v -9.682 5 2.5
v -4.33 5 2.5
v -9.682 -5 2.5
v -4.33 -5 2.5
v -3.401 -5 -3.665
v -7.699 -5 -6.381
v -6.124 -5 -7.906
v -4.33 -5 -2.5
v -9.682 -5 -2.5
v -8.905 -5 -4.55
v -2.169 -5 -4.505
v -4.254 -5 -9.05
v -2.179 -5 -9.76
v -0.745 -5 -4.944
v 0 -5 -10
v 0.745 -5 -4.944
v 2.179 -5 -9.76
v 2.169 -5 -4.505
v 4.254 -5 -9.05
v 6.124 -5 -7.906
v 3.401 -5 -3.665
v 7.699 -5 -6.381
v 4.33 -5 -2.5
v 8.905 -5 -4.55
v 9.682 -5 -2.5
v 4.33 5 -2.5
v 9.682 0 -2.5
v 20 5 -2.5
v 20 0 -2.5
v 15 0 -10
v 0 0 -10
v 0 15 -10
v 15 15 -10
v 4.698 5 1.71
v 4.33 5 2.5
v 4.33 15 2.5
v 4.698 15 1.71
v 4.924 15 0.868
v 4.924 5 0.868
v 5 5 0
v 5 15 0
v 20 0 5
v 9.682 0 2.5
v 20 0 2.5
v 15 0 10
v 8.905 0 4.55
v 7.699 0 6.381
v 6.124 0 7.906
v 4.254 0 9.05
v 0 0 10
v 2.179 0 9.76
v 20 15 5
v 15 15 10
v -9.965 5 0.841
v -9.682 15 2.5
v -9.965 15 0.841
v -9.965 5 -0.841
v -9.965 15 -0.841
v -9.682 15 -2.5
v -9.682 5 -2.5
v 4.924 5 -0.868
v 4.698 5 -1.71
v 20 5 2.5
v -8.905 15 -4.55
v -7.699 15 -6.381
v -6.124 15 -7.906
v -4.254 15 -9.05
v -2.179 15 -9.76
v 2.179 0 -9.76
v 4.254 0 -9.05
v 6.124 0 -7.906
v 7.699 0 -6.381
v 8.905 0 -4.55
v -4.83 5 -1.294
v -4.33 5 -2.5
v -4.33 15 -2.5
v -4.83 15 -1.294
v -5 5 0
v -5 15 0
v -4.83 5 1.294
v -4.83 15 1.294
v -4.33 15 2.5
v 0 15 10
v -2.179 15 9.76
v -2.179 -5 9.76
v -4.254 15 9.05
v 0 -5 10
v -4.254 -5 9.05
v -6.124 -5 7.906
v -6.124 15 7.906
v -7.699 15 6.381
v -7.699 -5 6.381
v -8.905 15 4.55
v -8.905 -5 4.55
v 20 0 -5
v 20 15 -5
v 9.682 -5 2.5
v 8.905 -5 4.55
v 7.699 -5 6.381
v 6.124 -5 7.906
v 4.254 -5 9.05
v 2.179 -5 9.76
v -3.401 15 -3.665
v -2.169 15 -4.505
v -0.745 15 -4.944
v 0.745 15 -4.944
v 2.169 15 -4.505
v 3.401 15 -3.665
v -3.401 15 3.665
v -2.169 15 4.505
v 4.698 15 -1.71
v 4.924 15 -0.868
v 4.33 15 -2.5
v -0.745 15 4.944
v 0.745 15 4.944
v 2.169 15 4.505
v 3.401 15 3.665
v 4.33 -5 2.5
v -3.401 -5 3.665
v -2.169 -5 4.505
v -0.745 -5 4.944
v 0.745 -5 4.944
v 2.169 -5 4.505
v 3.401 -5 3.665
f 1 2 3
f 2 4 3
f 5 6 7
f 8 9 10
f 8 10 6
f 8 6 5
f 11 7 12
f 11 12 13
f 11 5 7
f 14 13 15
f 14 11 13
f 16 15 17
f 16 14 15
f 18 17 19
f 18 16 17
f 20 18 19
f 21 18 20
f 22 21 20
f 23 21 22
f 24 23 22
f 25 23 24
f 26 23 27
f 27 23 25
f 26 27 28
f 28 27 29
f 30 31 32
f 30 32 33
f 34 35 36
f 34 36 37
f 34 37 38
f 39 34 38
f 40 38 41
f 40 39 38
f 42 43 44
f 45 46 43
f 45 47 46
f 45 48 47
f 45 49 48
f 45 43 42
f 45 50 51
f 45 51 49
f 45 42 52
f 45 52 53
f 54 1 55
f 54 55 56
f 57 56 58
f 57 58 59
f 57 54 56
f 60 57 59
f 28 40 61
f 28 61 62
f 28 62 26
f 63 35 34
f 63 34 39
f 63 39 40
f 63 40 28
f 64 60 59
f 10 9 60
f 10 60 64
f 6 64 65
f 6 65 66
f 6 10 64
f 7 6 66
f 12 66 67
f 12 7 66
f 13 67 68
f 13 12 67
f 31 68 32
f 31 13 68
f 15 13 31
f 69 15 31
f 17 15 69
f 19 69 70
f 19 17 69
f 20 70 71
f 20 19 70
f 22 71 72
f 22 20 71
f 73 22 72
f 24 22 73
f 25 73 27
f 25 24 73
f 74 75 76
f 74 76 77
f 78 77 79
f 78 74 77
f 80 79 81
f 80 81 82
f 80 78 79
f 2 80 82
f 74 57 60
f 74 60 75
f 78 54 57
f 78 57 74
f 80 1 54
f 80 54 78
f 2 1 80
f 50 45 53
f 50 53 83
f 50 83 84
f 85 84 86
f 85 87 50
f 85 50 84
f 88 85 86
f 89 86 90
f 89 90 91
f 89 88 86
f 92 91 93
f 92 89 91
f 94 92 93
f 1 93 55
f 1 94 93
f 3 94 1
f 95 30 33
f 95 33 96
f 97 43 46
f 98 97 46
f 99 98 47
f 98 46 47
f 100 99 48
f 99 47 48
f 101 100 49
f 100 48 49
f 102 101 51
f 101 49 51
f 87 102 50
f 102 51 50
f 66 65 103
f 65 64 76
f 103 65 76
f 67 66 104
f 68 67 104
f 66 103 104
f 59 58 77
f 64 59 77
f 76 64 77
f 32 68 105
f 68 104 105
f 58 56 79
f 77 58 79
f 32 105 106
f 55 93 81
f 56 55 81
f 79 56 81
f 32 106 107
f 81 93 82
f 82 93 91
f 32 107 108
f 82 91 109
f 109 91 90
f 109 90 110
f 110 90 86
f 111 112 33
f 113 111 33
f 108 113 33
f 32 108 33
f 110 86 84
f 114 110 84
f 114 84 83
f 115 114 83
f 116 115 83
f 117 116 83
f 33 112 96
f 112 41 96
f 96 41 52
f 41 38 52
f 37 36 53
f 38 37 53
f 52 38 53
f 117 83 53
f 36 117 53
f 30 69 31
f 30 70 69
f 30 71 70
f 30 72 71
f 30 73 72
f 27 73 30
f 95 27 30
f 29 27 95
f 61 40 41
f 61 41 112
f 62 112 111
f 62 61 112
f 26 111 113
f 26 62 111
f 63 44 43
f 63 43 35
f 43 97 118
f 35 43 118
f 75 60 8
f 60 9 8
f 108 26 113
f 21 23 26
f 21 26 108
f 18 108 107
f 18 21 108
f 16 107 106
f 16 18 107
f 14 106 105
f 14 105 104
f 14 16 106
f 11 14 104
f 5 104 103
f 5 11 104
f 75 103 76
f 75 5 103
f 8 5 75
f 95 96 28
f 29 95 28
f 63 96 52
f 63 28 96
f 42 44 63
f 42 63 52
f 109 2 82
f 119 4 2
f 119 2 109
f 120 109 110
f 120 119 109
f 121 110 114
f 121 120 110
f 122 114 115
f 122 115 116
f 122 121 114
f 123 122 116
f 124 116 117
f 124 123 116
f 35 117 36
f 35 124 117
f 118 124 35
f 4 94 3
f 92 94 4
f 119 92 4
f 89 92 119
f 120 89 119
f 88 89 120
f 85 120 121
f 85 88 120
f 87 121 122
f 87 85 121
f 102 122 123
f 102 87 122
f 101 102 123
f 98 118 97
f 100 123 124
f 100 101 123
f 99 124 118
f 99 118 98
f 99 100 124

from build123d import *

# Parameters (mm, degrees)
F1_DEPTH = 5
F2_DEPTH = 15
F3_DEPTH = 5


with BuildPart() as f1:
    # F0 (on Front) → F1 (new body)
    with BuildSketch(Plane.XZ):
        with BuildLine():
            ThreePointArc((-4.3301270189, 2.5), (0, 5), (4.3301270189, 2.5))
            Line((4.3301270189, 2.5), (9.6824583655, 2.5))
            ThreePointArc((9.6824583655, 2.5), (6.123724357, 7.9056941504), (0, 10))
            ThreePointArc((0, 10), (-6.123724357, 7.9056941504), (-9.6824583655, 2.5))
            Line((-9.6824583655, 2.5), (-4.3301270189, 2.5))
        make_face()
    extrude(amount=F1_DEPTH)



with BuildPart() as f1b:
    # F0 (on Front) → F1, piece 2 (new body)
    with BuildSketch(Plane.XZ):
        with BuildLine():
            Line((9.6824583655, -2.5), (4.3301270189, -2.5))
            ThreePointArc((4.3301270189, -2.5), (0, -5), (-4.3301270189, -2.5))
            Line((-4.3301270189, -2.5), (-9.6824583655, -2.5))
            ThreePointArc((-9.6824583655, -2.5), (-6.123724357, -7.9056941504), (0, -10))
            ThreePointArc((0, -10), (6.123724357, -7.9056941504), (9.6824583655, -2.5))
        make_face()
    extrude(amount=F1_DEPTH)


with BuildPart() as f1_1:
    add(f1.part)

    add(f1b.part)  # F2 merges F1b
    # F0 (on Front) → F2 (join)
    with BuildSketch(Plane.XZ):
        with BuildLine():
            ThreePointArc((0, 10), (6.123724357, 7.9056941504), (9.6824583655, 2.5))
            Line((9.6824583655, 2.5), (20, 2.5))
            Line((20, 2.5), (20, 5))
            Line((20, 5), (15, 10))
            Line((15, 10), (0, 10))
        make_face()
        with BuildLine():
            ThreePointArc((4.3301270189, 2.5), (4.8296291314, 1.2940952255), (5, 0))
            ThreePointArc((5, 0), (4.8296291314, -1.2940952255), (4.3301270189, -2.5))
            Line((4.3301270189, -2.5), (9.6824583655, -2.5))
            Line((9.6824583655, -2.5), (20, -2.5))
            Line((20, -2.5), (20, 2.5))
            Line((20, 2.5), (9.6824583655, 2.5))
            Line((9.6824583655, 2.5), (4.3301270189, 2.5))
        make_face()
        with BuildLine():
            ThreePointArc((-4.3301270189, -2.5), (-5, 0), (-4.3301270189, 2.5))
            Line((-4.3301270189, 2.5), (-9.6824583655, 2.5))
            ThreePointArc((-9.6824583655, 2.5), (-10, 0), (-9.6824583655, -2.5))
            Line((-9.6824583655, -2.5), (-4.3301270189, -2.5))
        make_face()
        with BuildLine():
            Line((20, -2.5), (9.6824583655, -2.5))
            ThreePointArc((9.6824583655, -2.5), (6.123724357, -7.9056941504), (0, -10))
            Line((0, -10), (15, -10))
            Line((15, -10), (20, -5))
            Line((20, -5), (20, -2.5))
        make_face()
        with BuildLine():
            ThreePointArc((-4.3301270189, 2.5), (0, 5), (4.3301270189, 2.5))
            Line((4.3301270189, 2.5), (9.6824583655, 2.5))
            ThreePointArc((9.6824583655, 2.5), (6.123724357, 7.9056941504), (0, 10))
            ThreePointArc((0, 10), (-6.123724357, 7.9056941504), (-9.6824583655, 2.5))
            Line((-9.6824583655, 2.5), (-4.3301270189, 2.5))
        make_face()
        with BuildLine():
            Line((9.6824583655, -2.5), (4.3301270189, -2.5))
            ThreePointArc((4.3301270189, -2.5), (0, -5), (-4.3301270189, -2.5))
            Line((-4.3301270189, -2.5), (-9.6824583655, -2.5))
            ThreePointArc((-9.6824583655, -2.5), (-6.123724357, -7.9056941504), (0, -10))
            ThreePointArc((0, -10), (6.123724357, -7.9056941504), (9.6824583655, -2.5))
        make_face()
    extrude(amount=-F2_DEPTH)

    # F0 (on Front) → F3 (cut)
    with BuildSketch(Plane.XZ):
        with BuildLine():
            ThreePointArc((4.3301270189, 2.5), (4.8296291314, 1.2940952255), (5, 0))
            ThreePointArc((5, 0), (4.8296291314, -1.2940952255), (4.3301270189, -2.5))
            Line((4.3301270189, -2.5), (9.6824583655, -2.5))
            Line((9.6824583655, -2.5), (20, -2.5))
            Line((20, -2.5), (20, 2.5))
            Line((20, 2.5), (9.6824583655, 2.5))
            Line((9.6824583655, 2.5), (4.3301270189, 2.5))
        make_face()
        with BuildLine():
            ThreePointArc((-4.3301270189, -2.5), (-5, 0), (-4.3301270189, 2.5))
            Line((-4.3301270189, 2.5), (-9.6824583655, 2.5))
            ThreePointArc((-9.6824583655, 2.5), (-10, 0), (-9.6824583655, -2.5))
            Line((-9.6824583655, -2.5), (-4.3301270189, -2.5))
        make_face()
    extrude(amount=-F3_DEPTH, mode=Mode.SUBTRACT)


solid = f1_1.part
